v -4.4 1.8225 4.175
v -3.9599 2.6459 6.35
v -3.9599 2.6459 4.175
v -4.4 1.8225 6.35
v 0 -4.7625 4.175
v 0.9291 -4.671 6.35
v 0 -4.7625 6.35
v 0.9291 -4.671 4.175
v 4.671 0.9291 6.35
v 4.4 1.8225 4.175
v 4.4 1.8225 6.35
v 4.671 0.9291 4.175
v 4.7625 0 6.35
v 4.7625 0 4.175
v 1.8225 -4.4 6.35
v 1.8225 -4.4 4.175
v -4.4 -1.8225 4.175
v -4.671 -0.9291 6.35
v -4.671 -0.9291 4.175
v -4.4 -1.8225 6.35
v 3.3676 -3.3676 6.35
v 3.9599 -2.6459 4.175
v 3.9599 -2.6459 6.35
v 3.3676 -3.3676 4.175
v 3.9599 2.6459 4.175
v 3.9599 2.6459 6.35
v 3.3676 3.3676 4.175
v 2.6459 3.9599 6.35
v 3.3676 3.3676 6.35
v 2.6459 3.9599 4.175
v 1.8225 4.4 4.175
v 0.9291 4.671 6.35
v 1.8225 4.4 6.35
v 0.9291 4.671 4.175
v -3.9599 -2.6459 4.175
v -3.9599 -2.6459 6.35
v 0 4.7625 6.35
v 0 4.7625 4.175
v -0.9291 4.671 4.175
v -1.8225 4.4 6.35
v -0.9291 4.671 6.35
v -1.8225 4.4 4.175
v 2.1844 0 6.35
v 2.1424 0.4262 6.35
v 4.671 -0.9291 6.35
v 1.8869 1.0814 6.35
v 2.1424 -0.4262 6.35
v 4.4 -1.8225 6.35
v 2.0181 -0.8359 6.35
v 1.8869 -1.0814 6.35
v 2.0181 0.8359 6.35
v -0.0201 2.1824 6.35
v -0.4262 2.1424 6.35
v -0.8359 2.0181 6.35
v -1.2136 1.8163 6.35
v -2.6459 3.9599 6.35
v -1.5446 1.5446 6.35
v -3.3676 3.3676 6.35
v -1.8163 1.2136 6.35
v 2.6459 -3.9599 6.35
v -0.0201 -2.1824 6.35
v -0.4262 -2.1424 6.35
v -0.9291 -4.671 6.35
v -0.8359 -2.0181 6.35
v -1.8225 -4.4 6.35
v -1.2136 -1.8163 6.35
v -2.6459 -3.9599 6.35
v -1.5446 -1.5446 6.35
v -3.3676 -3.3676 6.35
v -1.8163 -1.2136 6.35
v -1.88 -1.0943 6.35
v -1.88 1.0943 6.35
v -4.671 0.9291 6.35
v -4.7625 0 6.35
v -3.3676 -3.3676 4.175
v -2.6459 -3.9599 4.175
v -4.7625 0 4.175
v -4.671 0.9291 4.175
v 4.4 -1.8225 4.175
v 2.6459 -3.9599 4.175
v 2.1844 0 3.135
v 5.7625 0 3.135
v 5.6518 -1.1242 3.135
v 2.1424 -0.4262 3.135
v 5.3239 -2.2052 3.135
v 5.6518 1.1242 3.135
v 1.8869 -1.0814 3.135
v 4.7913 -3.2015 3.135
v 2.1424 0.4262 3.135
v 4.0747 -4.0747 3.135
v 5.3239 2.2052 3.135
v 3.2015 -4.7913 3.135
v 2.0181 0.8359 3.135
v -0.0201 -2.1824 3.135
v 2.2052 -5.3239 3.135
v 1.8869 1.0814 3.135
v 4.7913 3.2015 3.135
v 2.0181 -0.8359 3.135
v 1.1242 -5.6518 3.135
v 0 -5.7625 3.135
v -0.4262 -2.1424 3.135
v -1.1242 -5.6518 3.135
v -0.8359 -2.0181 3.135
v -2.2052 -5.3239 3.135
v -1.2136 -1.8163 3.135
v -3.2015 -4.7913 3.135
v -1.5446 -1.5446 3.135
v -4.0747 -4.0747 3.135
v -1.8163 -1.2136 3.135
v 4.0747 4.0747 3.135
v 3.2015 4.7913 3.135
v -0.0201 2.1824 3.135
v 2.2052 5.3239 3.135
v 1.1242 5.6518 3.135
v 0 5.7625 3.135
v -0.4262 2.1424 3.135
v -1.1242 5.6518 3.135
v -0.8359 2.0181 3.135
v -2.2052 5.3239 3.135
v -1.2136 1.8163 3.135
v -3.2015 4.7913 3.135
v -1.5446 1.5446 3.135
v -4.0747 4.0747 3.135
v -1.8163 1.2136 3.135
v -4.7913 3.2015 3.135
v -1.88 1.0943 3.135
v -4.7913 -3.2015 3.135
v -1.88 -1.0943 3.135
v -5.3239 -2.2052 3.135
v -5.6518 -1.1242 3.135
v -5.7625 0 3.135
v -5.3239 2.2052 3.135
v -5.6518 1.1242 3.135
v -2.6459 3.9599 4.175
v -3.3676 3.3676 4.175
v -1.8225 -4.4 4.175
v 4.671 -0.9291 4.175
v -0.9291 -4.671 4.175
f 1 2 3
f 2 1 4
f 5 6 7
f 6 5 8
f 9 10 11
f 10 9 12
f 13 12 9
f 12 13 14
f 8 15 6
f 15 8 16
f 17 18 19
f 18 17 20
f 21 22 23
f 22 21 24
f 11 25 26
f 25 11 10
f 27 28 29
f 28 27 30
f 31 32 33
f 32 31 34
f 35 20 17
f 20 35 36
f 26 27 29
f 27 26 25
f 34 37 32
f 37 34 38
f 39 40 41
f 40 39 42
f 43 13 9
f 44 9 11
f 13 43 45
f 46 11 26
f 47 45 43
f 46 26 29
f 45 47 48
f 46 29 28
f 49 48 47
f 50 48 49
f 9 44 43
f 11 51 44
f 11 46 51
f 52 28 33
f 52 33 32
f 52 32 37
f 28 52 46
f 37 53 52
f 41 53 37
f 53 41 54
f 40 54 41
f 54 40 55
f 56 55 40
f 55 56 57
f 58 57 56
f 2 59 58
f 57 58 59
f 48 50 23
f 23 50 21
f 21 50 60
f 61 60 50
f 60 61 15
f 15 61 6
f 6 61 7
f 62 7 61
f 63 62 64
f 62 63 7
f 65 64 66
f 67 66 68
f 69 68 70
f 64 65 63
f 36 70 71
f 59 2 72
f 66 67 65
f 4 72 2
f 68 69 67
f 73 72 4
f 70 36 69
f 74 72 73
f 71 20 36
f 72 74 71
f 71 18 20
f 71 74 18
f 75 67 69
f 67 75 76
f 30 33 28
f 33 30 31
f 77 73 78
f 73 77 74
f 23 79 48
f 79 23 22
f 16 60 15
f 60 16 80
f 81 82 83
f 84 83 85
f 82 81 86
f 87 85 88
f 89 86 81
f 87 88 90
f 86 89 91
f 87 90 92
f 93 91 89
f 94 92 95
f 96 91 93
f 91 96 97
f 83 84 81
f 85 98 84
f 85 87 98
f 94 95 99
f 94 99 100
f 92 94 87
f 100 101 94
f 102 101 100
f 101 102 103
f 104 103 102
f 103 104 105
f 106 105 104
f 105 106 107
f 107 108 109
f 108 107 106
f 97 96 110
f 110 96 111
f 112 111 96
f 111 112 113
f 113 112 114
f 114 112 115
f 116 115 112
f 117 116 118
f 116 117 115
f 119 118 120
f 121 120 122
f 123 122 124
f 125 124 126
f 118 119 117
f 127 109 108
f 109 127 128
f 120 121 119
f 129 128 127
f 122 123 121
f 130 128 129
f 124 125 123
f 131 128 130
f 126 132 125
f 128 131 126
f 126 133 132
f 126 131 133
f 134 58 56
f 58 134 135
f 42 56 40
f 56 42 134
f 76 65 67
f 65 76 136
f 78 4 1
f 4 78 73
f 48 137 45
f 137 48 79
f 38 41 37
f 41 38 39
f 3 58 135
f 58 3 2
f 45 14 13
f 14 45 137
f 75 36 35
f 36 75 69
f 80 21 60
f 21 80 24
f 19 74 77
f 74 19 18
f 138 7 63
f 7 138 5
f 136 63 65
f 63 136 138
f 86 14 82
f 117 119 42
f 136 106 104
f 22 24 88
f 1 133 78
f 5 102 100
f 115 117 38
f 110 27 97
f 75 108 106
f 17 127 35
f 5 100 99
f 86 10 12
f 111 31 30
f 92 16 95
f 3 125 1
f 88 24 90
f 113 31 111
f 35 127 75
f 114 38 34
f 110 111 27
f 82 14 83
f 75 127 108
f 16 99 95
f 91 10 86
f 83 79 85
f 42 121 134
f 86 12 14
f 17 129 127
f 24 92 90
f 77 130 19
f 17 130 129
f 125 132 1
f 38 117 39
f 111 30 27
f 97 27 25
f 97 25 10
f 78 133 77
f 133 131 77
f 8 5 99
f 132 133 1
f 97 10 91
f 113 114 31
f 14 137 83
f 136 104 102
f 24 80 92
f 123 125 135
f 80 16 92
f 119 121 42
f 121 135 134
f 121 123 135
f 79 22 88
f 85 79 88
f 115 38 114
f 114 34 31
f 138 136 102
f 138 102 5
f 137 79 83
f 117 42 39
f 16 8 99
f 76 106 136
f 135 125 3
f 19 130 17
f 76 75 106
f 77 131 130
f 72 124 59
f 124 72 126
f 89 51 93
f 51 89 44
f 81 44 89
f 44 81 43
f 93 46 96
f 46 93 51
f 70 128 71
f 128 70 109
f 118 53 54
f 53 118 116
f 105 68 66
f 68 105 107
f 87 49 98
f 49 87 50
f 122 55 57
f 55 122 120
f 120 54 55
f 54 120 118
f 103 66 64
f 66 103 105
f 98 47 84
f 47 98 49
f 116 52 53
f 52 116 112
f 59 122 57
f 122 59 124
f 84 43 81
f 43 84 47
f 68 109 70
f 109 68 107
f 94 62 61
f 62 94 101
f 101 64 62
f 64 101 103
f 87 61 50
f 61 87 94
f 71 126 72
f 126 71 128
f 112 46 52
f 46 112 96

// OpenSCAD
// Meccano spur gear maker
//
// v1.0 - Apr 2, 2018 - initial release SWH
// v1.1 - Apr 18, 2018 - code clean up and gear outline updates SWH
//
// Here's the 5 things you (may) need to set
//
// teeth: desired number of teeth
// gear_thickness: how many mm thick the gear disc should be
// dxf_path: the directory where the gear outline DXF files are
// boss_height: how many mm high above the gear the boss should extend.
// standard,triflat,twoflat: set exactly 1 of these 3 to true (others
// to false) to get either a standard axle hole, a triflat axle hole,
// or a two flat axle hole for the 28BYJ-48 stepper motor.
//
// It should go without saying that in order for this to work, a DXF
// outline file must exist to match the number of teeth you've chosen!
//
// The parameters for the gear outline maker at
// <http://hessmer.org/gears/InvoluteSpurGearBuilder.html>
// are:
//
// Circular pitch: 2.09990666845 for 38DP gears,
//                 2.127905424 for 37.5DP gear (15t,25t,50t,60t and the like)
// Pressure angle: 20
// Clearance: 0.25
// Backlash: 0.05
// Profile shift: 0
// Wheel 1 tooth count: desired # of teeth
// Wheel 1 Center Hole diameter: 0
// Wheel 2 tooth count: whatever you like (I pick something that will mesh at standard centres)
// Wheel 2 Center Hole diameter:: 0
// Show: Wheel 1 only
// Rotation steps per tooth angle: 10
// Number of segments: 30
//
// Depending on your printer's accuracy and tolerances, you may have to fiddle
// with Clearance and Backlash to get the gear to mesh properly. I did!
//
// imperial/metric constants
//
inch = 25.4;
half_inch = inch/2;
quarter_inch = inch/4;
//
$fn=32;                 // let's have nice round circles by default
eps=0.04;               // tiny number to eliminate coincident faces
//
// parametric values
// ------------------------------------------------------------
//
teeth = 57;             // 15, 19, 25, 38, 50, 57, 95, 114, 121, 133
                        // if you want other values, you'll have to
                        // create your own gear outline at
                        // http://hessmer.org/gears/InvoluteSpurGearBuilder.html
gear_thickness = inch/8;
boss_height = inch/8;   // set to zero for no boss
boss_dia = 3/8*inch;

standard = false;       // ONLY SET ONE OF THESE THREE TO TRUE
triflat = true;         // THE OTHER TWO MUST BE FALSE
twoflat = false;        //

triaxle_round_dia = 0.172*inch;// sized to fit a standard Meccano triaxle rod
triaxle_flats_dia = 3.76;      // ... YMMV
axle_dia = 0.167*inch;         // sized to pass a standard Meccano axle rod

twoflats_round_dia = 5.34;	     // for 28BYJ-48 stepper motors
twoflats_flat_dia = 3.34;      // (see Amazon or eBay to buy)
//
// ------------------------------------------------------------
//

// Make the gear
if ( teeth < 57 ) {
    spur_gear(teeth);                    // no ring of holes
} else if ( teeth < 95 ) {
    spur_gear(teeth,1);                  // 1 ring of holes
} else {
    spur_gear(teeth,2);                  // 2 rings of holes and slots
}

// ------------------------------------------------------------
//
// tube: create a cylinder of the given length and diameter
// at the point [x,y,z]
//
module tube (length, diameter, x=0, y=0, z=0) {
    translate([x,y,z-eps])
      cylinder(h=length+2*eps, r=diameter/2);
}

// ------------------------------------------------------------
//
// axle: create an axle with a particular cross section at [x,y,z]
//
// This is the function you'd modify to change the axle hole cross section.
// It's currently set up to create either tri-flat or round axle holes.
//
module axle(zlength, x=0, y=0, z=0) {
    if( twoflat ) {
        intersection() {
            tube(zlength,twoflats_round_dia,x,y,z);
            translate([x,y,z-eps])
                linear_extrude(height=zlength+2*eps)
                   square([twoflats_round_dia,twoflats_flat_dia],center=true);
        }
    } else if( triflat ) {
        intersection() {
            tube(zlength,triaxle_round_dia,x,y,z);
            // a circle with 3 sides is... you guessed, a triangle!
            translate([x,y,z-eps]) 
                linear_extrude(height=zlength+2*eps) 
                    circle(triaxle_flats_dia,$fn=3);
        }
    } else {
        tube(zlength,axle_dia,x,y,z);
    }
}

// ------------------------------------------------------------
//
// do_rings: add either a single ring of holes or two rings
// with alternating holes and slots extending between the rings
//
// hole_ring_angle is best set to something that divides 360 evenly
//
module do_rings( hole_ring_angle, rings ) {
    hole_ring1_radius = half_inch;   // 1st ring at 0.5" radius
    hole_ring2_radius = inch;        // 2nd ring at 1.0" radius
    hole_ring_dia = 0.172 * inch;    // sized for Meccano
    for( angle=[0:hole_ring_angle:360-hole_ring_angle]) {
        rotate([0,0,angle])
            tube(gear_thickness,hole_ring_dia,hole_ring1_radius,0,0);
        if( rings == 2 ) {
            rotate([0,0,angle]) 
                tube(gear_thickness,hole_ring_dia,hole_ring2_radius);
            rotate([0,0,angle+hole_ring_angle/2]) hull() {
                tube(gear_thickness,hole_ring_dia,hole_ring1_radius);
                tube(gear_thickness,hole_ring_dia,hole_ring2_radius);
            }
        }
    }
}

// ------------------------------------------------------------
//
// create a spur gear
//
// inputs:
//
// teeth: 15, 19, 25, 38, 50, 57, 95, 114, 121, 133
// rings: 0, 1, 2 (no holes, 1 ring of 8 holes, 2 rings of 4 holes and 4 slots)
// holes: number of holes (or holes+slots) in each ring. defaults to 8
//
module spur_gear(teeth,rings=0,num_holes=8) {
    gear_outline = str("Gear_outline_files/",teeth,"teeth.dxf");
    collar_width = 1; // a little angled collar between the boss and disc to add strength
    difference() {
        union() {
            linear_extrude(height=gear_thickness)
                import(gear_outline,convexity=10);
            if( boss_height>0 ) {
                tube(boss_height-eps, boss_dia, 0, 0, gear_thickness);
                if( boss_height>=collar_width ) {
                    translate([0,0,gear_thickness-eps])
                        cylinder(h=collar_width+eps,d1=boss_dia+2*collar_width,d2=boss_dia);
                }
            }
        }

        axle(boss_height+gear_thickness);

        if( rings > 0 ) {
            if ( rings == 1 ) {
                do_rings(360/num_holes,1);
            } else if ( rings == 2 ) {
                do_rings(720/num_holes,2);
            }
        }
    }
}
